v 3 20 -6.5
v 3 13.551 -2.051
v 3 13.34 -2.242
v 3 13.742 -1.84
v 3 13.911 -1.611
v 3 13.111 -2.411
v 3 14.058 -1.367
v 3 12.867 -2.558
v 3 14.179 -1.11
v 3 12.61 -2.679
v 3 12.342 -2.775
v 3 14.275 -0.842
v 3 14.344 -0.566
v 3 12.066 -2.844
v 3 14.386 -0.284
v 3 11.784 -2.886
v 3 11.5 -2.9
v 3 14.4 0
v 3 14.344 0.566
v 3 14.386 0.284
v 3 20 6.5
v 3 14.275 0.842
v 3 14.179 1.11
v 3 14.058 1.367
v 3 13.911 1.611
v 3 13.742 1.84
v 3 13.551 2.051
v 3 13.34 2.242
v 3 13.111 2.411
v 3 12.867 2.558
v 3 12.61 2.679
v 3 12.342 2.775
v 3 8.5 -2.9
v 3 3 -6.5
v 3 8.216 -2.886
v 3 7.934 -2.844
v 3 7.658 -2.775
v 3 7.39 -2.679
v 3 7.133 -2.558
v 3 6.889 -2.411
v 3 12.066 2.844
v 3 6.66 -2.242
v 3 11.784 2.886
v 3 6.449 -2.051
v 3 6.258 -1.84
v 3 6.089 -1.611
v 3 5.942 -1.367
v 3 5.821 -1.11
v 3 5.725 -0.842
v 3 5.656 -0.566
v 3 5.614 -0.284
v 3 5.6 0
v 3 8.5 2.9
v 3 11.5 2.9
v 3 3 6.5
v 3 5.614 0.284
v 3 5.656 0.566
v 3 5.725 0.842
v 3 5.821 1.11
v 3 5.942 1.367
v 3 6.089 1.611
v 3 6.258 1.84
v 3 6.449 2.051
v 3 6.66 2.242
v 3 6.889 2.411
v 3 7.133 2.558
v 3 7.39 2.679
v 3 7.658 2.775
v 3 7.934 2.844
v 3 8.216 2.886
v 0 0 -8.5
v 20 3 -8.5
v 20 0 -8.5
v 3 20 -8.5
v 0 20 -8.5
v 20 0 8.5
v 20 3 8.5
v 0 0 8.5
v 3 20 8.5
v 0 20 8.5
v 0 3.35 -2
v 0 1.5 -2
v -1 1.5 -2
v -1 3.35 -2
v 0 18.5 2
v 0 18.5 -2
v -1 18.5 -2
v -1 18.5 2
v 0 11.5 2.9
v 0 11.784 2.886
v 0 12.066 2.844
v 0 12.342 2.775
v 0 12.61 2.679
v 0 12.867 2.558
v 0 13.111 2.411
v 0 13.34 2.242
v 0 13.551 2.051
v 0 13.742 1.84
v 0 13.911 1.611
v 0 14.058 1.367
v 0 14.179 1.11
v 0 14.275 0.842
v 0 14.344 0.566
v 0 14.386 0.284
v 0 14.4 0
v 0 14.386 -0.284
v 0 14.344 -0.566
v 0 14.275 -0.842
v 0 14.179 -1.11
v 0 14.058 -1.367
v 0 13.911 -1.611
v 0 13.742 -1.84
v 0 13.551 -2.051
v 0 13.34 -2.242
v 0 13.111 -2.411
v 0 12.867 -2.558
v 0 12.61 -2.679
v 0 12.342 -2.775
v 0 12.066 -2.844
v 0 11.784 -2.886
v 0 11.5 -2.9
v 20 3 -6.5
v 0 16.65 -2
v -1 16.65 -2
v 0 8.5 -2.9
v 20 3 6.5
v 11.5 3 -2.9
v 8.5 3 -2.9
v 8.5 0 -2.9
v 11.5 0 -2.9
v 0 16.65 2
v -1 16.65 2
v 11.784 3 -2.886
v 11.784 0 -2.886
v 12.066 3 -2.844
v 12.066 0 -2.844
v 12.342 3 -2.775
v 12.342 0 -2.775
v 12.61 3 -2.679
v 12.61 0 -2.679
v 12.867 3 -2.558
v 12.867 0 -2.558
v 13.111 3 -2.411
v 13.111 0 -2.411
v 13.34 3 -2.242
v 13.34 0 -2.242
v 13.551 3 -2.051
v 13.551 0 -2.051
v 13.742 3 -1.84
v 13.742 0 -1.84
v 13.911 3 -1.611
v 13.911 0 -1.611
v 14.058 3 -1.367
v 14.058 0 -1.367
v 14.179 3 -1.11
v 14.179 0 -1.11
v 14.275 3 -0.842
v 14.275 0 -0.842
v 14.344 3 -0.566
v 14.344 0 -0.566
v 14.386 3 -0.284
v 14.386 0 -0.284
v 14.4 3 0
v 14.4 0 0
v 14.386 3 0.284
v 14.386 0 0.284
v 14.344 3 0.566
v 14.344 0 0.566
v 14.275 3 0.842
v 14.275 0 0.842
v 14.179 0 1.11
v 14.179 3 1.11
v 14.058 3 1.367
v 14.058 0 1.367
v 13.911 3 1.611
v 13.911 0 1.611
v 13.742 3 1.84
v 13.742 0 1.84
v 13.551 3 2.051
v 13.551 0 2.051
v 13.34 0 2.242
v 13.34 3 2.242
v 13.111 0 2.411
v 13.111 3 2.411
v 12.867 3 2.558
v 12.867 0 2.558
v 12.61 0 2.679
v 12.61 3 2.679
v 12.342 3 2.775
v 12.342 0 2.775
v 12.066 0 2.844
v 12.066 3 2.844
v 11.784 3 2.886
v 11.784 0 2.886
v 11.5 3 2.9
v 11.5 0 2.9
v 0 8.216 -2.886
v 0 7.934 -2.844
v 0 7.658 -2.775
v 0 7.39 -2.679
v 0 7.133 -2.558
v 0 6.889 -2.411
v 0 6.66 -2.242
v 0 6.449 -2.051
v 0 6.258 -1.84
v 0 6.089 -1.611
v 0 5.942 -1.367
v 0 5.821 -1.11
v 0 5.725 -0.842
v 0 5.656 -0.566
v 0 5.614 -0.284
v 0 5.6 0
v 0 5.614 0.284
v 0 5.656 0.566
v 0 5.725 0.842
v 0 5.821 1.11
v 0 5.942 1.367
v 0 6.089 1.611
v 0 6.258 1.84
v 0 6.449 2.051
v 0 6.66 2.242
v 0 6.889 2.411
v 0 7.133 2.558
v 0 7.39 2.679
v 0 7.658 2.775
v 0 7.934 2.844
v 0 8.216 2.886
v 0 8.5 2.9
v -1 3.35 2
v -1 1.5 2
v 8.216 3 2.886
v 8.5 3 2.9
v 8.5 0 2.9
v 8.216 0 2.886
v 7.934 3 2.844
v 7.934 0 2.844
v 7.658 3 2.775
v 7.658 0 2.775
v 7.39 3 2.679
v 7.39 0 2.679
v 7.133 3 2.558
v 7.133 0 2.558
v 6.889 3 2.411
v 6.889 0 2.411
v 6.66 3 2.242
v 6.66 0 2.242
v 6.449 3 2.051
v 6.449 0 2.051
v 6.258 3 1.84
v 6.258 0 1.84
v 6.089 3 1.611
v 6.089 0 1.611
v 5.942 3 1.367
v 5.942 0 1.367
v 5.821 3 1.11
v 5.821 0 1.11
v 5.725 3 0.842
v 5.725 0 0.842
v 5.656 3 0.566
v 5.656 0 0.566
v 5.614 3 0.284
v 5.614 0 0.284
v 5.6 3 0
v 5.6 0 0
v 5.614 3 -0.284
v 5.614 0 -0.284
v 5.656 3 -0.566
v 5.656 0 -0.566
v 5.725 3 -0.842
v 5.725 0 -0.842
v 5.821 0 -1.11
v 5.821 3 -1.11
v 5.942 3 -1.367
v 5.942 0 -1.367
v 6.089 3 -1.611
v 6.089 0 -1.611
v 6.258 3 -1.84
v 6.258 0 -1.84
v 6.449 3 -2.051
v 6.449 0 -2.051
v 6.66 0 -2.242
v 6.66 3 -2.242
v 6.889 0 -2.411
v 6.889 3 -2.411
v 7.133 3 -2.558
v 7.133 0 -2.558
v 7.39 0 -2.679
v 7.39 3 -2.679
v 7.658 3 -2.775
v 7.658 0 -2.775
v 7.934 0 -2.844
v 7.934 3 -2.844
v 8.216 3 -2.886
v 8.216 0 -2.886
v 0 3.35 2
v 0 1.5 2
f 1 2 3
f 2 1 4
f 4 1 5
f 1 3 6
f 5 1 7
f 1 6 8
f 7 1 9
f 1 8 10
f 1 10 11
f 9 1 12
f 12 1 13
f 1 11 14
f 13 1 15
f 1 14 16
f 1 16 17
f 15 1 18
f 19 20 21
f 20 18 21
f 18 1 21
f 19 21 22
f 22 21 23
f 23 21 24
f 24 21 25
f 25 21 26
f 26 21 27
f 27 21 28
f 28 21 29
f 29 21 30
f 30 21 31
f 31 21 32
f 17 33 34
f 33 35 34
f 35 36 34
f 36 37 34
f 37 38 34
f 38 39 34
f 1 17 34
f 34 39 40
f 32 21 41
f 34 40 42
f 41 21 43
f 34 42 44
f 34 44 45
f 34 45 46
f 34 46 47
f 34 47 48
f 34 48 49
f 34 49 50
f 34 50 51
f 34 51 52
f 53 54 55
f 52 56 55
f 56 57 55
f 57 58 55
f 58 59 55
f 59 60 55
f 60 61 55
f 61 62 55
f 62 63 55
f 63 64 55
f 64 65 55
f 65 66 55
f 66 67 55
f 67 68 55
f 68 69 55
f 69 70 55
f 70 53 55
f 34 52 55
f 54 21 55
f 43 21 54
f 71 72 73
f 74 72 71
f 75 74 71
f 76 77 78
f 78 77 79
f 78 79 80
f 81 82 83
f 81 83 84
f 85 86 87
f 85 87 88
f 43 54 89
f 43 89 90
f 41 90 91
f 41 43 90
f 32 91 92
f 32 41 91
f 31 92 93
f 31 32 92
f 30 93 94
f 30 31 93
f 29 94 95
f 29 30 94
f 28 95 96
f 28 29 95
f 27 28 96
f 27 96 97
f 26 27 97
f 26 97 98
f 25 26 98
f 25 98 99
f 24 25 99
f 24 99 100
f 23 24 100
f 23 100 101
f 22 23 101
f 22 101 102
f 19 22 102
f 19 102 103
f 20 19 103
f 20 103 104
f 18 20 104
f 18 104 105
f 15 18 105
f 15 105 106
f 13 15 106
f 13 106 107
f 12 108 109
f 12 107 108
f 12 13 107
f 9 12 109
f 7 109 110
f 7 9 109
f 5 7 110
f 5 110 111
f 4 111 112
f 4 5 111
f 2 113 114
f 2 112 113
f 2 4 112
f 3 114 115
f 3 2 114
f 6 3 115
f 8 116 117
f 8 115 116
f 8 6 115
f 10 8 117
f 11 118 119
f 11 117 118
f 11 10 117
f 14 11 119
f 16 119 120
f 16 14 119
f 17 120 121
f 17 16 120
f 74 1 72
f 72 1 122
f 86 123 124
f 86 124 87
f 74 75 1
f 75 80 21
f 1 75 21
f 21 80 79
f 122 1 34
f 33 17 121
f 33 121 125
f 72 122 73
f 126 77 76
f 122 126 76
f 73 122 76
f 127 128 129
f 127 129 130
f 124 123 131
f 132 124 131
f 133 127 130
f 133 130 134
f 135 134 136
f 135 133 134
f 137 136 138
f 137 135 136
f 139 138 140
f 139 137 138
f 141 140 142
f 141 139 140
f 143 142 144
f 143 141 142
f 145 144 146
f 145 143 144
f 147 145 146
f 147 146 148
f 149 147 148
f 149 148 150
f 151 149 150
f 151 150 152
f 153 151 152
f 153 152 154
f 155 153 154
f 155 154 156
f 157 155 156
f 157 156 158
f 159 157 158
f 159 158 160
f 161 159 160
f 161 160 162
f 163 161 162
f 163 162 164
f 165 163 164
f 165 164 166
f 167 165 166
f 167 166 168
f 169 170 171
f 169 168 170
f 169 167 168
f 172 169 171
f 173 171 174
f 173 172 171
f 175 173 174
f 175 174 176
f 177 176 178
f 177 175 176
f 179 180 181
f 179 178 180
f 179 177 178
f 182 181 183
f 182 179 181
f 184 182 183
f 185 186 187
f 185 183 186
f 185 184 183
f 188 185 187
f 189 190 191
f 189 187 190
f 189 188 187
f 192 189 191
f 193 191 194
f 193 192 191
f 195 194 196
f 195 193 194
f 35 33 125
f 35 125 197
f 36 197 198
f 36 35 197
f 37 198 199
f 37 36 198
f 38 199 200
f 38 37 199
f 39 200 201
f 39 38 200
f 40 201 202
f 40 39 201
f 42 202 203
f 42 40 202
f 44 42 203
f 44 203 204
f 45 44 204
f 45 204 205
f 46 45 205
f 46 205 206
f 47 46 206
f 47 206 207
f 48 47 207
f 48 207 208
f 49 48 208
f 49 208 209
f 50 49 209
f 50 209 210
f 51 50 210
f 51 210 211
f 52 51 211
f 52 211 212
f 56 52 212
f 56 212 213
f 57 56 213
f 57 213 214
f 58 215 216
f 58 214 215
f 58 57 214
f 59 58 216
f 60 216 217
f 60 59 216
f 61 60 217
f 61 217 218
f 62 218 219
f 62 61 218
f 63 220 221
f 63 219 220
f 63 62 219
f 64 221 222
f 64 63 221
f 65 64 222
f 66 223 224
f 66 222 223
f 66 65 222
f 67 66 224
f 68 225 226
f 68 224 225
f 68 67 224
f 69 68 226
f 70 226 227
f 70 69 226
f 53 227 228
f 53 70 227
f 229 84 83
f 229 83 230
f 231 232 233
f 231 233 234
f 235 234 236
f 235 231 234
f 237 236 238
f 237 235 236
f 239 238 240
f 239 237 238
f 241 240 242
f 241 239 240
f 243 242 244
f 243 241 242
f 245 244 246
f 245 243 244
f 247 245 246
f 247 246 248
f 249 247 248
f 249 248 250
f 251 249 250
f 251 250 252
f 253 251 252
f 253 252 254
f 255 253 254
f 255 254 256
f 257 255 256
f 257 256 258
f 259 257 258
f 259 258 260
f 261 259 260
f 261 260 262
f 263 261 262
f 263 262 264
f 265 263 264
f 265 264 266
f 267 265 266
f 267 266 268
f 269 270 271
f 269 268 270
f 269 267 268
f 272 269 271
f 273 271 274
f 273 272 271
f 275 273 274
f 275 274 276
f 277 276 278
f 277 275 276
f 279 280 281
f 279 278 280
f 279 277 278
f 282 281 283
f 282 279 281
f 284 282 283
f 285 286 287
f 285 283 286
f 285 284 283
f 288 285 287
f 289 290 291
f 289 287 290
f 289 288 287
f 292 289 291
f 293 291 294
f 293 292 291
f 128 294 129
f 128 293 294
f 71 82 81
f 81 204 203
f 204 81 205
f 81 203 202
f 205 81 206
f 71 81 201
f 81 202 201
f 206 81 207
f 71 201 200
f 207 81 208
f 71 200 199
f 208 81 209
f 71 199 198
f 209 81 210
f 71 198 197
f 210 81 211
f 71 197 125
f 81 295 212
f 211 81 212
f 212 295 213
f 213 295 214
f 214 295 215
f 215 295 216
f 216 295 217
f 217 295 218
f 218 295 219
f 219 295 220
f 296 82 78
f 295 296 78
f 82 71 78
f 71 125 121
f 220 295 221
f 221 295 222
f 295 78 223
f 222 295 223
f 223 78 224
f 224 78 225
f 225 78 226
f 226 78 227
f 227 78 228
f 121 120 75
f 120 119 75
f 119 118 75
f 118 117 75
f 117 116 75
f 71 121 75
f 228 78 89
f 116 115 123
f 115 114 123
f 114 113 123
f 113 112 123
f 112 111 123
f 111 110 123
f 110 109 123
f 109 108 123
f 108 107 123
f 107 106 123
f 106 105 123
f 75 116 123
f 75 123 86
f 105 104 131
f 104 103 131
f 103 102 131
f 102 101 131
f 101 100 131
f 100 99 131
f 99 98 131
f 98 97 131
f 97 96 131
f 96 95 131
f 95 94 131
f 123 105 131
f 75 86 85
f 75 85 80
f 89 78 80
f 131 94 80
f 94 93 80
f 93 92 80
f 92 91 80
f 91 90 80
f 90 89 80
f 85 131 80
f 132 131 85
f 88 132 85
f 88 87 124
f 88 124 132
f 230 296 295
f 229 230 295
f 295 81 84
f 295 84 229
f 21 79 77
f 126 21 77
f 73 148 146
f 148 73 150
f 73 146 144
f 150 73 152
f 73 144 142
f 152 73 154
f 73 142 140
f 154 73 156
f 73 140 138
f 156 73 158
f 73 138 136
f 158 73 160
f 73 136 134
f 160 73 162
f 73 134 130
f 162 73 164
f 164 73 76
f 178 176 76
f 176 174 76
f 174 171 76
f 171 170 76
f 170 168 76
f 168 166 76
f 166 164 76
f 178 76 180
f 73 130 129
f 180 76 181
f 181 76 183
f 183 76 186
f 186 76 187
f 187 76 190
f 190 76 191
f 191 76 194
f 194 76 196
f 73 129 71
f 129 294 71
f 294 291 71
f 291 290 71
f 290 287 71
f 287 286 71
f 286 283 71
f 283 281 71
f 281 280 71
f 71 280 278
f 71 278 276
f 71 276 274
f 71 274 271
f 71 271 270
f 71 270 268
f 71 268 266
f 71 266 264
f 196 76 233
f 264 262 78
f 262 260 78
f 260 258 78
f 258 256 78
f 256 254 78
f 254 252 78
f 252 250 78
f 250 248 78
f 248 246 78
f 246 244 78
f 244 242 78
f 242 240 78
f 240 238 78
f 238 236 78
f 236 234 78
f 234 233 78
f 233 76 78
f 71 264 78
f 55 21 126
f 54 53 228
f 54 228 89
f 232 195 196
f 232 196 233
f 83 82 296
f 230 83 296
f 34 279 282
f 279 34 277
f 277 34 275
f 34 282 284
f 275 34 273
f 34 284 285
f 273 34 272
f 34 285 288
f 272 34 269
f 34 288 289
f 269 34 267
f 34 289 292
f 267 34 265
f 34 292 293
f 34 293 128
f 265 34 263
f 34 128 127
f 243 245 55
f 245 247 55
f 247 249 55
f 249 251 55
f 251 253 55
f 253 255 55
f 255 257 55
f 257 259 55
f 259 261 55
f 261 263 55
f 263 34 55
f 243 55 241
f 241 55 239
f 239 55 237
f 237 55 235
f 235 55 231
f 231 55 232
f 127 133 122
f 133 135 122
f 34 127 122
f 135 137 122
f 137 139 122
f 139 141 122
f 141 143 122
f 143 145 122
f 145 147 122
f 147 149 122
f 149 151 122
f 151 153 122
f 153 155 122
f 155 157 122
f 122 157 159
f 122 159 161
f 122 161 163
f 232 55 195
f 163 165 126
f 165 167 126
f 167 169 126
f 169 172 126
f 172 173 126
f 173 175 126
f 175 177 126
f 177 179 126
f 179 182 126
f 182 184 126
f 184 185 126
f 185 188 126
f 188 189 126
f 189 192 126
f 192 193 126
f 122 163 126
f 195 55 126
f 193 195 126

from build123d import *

# Parameters (mm, degrees)
BOSS_EXTRUDE1_DEPTH = 8.5
CUT_EXTRUDE1_START  = -2
CUT_EXTRUDE1_DEPTH  = 13
CUT_EXTRUDE2_DEPTH  = 28.590759323
CUT_EXTRUDE3_DEPTH  = 28.590759323
SKETCH5_W           = 4
SKETCH5_H           = 1.85
BOSS_EXTRUDE2_DEPTH = 1


with BuildPart() as part:
    # Sketch1 → Boss-Extrude1 (new, symmetric)
    with BuildSketch(Plane.XY):
        Polygon((0, 0), (0, 20), (3, 20), (20, 3), (20, 0), align=None)
    extrude(amount=BOSS_EXTRUDE1_DEPTH, both=True)

    # Sketch2 → Cut-Extrude1 (cut)
    with BuildSketch(Plane.XY.offset(8.5).offset(CUT_EXTRUDE1_START)):
        Polygon((3, 20), (3, 3), (20, 3), align=None)
    extrude(amount=-CUT_EXTRUDE1_DEPTH, mode=Mode.SUBTRACT)

    # Sketch3 → Cut-Extrude2 (cut, through all)
    with BuildSketch(Plane(origin=(3, 0, 0), x_dir=(0, 0, -1), z_dir=(1, 0, 0))):
        with BuildLine():
            Line((2.9, 11.5), (2.9, 8.5))
            ThreePointArc((2.9, 8.5), (0, 5.6), (-2.9, 8.5))
            Line((-2.9, 8.5), (-2.9, 11.5))
            ThreePointArc((-2.9, 11.5), (0, 14.4), (2.9, 11.5))
        make_face()
    extrude(amount=-CUT_EXTRUDE2_DEPTH, mode=Mode.SUBTRACT)

    # Sketch4 → Cut-Extrude3 (cut, through all)
    with BuildSketch(Plane(origin=(0, 3, 0), x_dir=(1, 0, 0), z_dir=(0, 1, 0))):
        with BuildLine():
            Line((11.5, -2.9), (8.5, -2.9))
            ThreePointArc((8.5, -2.9), (5.6, 0), (8.5, 2.9))
            Line((8.5, 2.9), (11.5, 2.9))
            ThreePointArc((11.5, 2.9), (14.4, 0), (11.5, -2.9))
        make_face()
    extrude(amount=-CUT_EXTRUDE3_DEPTH, mode=Mode.SUBTRACT)

    # Sketch5 → Boss-Extrude2 (add)
    with BuildSketch(Plane.ZY):
        with Locations((0, 17.575)):
            Rectangle(SKETCH5_W, SKETCH5_H)
        with Locations((0, 2.425)):
            Rectangle(SKETCH5_W, SKETCH5_H)
    extrude(amount=BOSS_EXTRUDE2_DEPTH)


solid = part.part
